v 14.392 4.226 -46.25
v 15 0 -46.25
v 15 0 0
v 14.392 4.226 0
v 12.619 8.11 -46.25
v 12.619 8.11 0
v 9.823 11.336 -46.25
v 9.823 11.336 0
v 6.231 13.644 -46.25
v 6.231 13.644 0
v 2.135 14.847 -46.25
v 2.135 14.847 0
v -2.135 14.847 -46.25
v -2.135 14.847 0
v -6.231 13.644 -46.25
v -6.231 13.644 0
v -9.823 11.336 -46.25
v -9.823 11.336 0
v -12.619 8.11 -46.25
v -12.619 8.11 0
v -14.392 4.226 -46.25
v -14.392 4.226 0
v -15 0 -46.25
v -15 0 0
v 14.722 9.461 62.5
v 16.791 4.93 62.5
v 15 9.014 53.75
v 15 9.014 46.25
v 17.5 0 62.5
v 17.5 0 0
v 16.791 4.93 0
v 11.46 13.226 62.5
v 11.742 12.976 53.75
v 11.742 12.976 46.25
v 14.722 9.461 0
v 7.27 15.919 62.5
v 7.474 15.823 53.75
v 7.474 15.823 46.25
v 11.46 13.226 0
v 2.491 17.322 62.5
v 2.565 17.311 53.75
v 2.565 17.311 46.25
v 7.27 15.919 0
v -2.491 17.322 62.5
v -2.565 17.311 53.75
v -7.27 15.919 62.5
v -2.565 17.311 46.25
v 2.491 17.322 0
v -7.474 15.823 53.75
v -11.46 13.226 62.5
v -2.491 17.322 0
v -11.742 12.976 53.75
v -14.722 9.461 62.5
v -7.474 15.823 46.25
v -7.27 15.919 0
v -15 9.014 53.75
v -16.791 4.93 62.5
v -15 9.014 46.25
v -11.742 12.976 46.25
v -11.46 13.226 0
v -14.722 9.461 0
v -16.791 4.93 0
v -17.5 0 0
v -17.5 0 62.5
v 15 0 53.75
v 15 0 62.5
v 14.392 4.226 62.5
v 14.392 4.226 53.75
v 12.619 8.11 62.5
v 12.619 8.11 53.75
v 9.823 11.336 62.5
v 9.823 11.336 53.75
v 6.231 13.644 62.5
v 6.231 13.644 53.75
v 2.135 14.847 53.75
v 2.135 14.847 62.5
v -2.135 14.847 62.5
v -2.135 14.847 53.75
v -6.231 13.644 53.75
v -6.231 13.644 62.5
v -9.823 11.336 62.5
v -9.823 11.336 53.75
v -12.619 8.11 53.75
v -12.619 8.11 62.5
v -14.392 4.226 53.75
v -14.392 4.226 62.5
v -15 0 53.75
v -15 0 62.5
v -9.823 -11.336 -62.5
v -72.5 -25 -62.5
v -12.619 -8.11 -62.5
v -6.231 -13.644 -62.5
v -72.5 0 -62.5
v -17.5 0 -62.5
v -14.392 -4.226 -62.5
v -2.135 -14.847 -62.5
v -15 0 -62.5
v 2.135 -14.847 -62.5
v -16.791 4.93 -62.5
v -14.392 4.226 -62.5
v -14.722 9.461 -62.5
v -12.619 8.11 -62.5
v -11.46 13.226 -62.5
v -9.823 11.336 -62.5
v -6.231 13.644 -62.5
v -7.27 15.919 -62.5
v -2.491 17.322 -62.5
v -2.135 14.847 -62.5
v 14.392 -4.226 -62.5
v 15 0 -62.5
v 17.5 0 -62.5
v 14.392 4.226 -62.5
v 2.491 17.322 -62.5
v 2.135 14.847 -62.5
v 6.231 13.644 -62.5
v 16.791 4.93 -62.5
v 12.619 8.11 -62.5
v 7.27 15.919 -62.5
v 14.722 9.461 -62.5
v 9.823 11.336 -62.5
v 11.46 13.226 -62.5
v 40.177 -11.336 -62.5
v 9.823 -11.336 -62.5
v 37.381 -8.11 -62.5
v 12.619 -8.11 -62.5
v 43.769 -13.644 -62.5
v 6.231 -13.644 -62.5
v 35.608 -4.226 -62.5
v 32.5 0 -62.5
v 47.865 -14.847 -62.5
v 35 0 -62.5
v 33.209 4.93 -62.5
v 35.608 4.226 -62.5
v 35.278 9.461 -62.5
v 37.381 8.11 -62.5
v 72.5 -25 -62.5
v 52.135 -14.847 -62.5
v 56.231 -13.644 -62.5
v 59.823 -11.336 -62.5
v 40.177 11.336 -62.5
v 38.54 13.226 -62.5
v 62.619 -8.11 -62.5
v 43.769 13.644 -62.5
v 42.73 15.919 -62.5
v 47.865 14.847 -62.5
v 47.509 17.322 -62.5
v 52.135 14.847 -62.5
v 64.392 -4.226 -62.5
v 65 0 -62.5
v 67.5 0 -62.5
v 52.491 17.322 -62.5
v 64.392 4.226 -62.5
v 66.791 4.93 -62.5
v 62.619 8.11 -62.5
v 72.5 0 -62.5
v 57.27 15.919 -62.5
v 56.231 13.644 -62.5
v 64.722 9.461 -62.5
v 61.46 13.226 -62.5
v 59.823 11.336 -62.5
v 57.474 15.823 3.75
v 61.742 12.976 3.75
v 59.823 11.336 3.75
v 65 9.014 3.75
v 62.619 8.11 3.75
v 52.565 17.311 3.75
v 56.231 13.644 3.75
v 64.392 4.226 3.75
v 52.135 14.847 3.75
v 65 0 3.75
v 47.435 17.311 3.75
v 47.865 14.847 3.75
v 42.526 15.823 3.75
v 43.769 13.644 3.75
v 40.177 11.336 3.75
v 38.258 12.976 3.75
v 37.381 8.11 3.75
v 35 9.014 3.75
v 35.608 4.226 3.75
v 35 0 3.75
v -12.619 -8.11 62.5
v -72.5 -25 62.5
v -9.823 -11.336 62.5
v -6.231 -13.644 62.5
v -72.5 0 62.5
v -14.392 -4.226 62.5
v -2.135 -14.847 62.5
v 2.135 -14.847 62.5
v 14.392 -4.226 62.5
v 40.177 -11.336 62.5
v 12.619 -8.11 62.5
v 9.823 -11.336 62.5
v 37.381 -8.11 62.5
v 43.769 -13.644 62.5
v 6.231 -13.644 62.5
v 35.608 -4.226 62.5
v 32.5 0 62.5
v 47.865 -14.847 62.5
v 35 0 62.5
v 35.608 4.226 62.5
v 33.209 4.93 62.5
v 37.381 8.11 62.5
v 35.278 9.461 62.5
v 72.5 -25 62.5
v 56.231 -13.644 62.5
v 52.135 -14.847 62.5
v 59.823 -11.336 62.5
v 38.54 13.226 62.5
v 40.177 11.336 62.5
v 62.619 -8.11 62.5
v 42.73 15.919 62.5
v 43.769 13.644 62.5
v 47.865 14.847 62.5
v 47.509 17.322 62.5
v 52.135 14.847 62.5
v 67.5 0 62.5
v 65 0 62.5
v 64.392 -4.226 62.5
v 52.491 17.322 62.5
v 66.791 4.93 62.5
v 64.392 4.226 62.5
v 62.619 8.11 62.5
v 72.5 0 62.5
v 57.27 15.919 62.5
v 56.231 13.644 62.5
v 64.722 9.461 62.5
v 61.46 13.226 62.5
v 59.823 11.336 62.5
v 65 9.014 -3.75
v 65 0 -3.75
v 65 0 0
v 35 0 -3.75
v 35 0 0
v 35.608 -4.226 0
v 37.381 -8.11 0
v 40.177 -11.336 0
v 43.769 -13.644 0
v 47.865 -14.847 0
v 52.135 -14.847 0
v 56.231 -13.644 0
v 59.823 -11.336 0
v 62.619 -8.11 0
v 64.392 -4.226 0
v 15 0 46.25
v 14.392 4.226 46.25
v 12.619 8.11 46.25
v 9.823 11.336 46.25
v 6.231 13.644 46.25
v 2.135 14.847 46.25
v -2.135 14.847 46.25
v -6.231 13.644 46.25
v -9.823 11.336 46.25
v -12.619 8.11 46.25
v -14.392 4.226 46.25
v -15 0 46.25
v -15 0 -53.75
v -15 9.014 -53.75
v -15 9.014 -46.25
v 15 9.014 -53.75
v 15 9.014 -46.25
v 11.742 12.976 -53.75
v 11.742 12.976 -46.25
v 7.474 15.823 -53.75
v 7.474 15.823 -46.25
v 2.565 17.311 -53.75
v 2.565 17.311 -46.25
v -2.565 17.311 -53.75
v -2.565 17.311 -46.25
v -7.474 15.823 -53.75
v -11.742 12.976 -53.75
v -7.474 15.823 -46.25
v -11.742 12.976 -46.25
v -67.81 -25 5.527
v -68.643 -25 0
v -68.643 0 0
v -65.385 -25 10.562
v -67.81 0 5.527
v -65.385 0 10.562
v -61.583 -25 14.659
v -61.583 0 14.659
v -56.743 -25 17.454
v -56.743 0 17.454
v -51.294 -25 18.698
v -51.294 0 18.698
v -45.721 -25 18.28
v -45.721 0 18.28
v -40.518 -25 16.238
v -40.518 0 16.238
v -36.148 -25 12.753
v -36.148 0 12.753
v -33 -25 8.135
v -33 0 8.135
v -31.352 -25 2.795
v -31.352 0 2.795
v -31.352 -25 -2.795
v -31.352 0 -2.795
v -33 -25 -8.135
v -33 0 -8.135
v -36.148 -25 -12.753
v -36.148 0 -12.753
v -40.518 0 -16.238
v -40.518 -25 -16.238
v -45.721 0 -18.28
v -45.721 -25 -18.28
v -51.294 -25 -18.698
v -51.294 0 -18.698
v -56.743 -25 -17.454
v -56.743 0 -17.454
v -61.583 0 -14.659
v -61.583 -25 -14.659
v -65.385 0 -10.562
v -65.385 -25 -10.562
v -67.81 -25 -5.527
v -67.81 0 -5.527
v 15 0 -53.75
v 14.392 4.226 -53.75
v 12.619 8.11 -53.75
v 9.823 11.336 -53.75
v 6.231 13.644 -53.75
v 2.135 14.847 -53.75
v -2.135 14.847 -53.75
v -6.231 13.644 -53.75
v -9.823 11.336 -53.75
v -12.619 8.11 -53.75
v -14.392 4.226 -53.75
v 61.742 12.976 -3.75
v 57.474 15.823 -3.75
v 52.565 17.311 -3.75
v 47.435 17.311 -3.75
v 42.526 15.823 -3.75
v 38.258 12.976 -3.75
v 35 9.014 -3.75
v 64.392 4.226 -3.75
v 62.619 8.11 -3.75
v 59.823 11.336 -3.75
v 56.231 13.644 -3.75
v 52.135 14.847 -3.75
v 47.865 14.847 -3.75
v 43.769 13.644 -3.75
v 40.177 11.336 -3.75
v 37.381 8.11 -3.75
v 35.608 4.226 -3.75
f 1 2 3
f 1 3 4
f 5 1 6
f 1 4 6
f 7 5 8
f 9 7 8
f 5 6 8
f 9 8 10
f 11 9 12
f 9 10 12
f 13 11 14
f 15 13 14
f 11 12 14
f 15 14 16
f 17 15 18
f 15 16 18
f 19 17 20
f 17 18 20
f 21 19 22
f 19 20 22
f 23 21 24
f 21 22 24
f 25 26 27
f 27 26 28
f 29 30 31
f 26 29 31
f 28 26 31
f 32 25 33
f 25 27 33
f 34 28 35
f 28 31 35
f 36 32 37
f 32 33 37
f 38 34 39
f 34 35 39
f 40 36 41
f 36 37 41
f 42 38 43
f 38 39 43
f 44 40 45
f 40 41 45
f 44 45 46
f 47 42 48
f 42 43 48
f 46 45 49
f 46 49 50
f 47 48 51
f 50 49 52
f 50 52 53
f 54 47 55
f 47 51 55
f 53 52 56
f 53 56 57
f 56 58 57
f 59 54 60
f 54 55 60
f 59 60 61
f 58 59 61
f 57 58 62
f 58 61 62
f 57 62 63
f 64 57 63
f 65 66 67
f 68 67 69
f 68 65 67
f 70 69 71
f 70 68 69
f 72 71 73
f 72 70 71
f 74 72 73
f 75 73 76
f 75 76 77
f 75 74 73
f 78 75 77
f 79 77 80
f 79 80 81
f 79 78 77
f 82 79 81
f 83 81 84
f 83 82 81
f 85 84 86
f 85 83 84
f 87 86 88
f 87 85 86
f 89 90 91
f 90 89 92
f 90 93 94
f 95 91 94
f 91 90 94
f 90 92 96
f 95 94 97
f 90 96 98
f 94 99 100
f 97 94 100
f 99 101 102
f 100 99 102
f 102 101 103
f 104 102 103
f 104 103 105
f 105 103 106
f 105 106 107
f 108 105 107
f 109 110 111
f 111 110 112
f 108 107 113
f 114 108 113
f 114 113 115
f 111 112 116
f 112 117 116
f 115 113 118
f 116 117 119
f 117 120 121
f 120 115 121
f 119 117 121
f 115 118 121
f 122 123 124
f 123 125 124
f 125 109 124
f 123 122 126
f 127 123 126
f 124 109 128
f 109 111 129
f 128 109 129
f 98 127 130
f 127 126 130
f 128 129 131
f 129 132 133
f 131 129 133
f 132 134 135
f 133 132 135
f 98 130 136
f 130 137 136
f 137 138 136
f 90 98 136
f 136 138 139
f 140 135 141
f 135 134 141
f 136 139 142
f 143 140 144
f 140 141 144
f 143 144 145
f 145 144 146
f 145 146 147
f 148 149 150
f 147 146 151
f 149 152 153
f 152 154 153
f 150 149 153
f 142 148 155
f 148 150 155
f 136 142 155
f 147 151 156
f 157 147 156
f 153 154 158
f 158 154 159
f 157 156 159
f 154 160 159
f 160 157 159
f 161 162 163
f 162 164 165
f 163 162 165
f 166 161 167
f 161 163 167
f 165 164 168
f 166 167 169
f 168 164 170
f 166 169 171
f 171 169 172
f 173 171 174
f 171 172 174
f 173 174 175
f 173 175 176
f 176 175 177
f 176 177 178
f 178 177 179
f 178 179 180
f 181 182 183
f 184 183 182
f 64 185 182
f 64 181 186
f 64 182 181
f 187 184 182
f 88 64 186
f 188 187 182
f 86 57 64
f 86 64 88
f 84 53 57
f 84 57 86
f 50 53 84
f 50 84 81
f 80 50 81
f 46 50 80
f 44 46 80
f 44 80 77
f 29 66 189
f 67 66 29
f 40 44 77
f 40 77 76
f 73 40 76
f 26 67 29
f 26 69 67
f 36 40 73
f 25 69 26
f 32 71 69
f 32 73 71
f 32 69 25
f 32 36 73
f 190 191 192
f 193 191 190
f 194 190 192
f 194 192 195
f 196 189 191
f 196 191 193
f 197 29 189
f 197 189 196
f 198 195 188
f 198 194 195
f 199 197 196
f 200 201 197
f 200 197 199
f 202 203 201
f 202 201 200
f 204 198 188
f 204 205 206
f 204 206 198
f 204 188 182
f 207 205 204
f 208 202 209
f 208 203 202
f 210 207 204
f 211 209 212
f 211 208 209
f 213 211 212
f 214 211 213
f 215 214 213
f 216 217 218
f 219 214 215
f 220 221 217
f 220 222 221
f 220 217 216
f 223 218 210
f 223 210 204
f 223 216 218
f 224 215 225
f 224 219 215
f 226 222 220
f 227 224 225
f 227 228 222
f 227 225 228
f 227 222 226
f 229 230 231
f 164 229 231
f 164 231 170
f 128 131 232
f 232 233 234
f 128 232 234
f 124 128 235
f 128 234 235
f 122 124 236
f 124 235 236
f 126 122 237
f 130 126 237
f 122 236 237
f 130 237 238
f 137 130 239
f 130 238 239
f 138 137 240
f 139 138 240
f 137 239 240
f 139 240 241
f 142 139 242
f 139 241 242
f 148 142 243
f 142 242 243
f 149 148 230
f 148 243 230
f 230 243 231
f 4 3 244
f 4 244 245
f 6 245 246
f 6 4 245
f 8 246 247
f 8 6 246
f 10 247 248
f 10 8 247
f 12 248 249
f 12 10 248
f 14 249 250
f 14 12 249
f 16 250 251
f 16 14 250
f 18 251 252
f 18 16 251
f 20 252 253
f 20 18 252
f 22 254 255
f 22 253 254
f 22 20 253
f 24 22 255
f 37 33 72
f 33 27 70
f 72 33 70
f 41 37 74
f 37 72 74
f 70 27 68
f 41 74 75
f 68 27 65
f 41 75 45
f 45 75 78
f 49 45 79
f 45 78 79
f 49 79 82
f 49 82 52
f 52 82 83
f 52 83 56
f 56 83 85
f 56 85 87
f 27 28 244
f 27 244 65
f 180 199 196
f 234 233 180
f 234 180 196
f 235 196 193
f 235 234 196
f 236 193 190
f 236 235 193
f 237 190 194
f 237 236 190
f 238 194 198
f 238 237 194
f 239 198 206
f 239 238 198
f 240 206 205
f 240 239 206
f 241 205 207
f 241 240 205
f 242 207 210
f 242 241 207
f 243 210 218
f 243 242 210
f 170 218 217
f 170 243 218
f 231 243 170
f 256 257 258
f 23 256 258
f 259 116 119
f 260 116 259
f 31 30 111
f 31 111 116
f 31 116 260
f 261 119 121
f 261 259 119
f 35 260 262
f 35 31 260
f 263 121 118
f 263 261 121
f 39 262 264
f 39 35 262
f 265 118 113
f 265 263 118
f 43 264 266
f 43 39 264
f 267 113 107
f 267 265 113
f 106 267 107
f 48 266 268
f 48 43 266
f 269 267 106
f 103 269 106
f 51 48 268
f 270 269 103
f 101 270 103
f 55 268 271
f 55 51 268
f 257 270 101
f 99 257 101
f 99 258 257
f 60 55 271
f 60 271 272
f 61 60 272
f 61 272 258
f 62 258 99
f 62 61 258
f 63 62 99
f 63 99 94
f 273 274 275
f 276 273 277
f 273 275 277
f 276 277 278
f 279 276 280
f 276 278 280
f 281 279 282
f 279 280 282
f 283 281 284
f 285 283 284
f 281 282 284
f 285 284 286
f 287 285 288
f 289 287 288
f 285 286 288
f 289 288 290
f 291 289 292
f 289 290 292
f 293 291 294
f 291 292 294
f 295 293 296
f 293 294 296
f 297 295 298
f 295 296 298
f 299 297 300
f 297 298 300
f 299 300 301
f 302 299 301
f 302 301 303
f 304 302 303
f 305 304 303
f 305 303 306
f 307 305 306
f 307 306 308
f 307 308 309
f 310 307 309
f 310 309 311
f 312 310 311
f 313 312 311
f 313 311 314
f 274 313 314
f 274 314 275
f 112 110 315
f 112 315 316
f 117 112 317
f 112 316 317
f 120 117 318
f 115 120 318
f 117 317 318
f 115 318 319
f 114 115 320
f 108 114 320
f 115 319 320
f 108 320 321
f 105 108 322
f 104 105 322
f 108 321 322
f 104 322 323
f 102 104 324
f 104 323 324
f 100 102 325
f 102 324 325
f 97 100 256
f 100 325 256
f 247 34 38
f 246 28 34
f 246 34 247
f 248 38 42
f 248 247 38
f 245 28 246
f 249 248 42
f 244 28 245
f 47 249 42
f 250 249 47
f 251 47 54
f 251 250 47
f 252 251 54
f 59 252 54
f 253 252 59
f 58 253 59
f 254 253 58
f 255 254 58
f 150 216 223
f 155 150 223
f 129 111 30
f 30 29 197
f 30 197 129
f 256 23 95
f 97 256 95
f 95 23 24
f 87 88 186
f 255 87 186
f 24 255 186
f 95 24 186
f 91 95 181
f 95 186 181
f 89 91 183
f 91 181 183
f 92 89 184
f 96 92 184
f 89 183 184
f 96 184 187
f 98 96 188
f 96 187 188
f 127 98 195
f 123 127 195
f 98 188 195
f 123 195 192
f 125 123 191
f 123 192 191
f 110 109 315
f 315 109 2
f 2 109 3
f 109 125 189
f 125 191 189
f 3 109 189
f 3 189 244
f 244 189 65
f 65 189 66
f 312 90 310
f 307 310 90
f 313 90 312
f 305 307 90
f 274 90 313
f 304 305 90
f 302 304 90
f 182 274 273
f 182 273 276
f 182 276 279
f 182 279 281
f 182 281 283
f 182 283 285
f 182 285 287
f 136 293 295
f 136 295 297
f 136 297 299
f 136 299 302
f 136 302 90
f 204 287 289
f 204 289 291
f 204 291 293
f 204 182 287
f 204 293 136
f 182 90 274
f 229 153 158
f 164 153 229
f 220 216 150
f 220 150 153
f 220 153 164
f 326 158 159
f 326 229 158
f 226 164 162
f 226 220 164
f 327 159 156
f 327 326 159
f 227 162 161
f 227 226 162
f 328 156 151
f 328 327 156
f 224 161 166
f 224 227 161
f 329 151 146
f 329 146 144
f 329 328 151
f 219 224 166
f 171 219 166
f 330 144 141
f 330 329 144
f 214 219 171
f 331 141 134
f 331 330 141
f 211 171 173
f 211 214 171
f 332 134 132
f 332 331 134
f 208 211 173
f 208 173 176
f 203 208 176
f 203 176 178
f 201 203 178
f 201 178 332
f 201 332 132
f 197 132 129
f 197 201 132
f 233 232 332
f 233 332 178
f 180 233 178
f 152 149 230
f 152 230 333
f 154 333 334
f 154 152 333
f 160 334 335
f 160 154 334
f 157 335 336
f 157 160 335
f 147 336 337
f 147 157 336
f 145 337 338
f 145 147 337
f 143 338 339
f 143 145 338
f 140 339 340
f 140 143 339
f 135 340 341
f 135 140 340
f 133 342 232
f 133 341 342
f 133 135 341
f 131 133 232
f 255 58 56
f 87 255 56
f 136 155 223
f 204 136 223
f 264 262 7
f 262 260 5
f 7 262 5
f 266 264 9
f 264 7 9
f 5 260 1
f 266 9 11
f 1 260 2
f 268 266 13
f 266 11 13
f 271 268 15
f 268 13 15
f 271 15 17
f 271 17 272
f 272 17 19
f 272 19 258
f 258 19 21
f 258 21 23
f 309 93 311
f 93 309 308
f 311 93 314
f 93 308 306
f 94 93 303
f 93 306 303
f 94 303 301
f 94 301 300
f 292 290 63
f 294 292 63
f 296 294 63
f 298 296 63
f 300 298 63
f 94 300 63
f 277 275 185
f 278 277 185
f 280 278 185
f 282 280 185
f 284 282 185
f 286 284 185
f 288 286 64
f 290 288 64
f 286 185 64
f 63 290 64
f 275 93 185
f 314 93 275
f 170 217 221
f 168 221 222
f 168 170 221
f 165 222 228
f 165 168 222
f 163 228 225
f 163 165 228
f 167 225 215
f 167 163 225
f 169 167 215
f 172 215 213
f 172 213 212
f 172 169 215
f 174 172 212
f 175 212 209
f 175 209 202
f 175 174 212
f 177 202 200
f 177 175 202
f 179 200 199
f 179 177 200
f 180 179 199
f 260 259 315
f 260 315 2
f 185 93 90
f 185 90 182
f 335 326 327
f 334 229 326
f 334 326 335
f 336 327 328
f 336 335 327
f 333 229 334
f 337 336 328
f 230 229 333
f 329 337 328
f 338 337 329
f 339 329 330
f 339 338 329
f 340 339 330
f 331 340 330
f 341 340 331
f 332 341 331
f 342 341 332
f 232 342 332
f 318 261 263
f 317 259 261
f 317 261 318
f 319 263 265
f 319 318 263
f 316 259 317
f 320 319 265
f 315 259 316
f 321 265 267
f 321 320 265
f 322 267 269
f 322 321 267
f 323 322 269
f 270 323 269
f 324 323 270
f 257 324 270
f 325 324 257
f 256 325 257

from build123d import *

# Parameters (mm, degrees)
F0_W     = 145
F0_H     = 125
F1_DEPTH = 25
F3_R     = 17.5
F3_R_2   = 15
F4_DEPTH = 62.5
F2_W     = 30
F2_H     = 7.5
F5_DEPTH = 25
F6_DEPTH = 25
F2_R     = 18.75
F7_DEPTH = 2000
F8_DEPTH = 12500


with BuildPart() as f1:
    # F0 (on Front) → F1 (new body)
    with BuildSketch(Plane.XZ):
        Rectangle(F0_W, F0_H)
    extrude(amount=F1_DEPTH)

    # F3 (on Top) → F4 (join, symmetric)
    with BuildSketch(Plane.XY):
        Circle(F3_R)
        Circle(F3_R_2, mode=Mode.SUBTRACT)
        with Locations((50, 0)):
            Circle(F3_R)
        with Locations((50, 0)):
            Circle(F3_R_2, mode=Mode.SUBTRACT)
    extrude(amount=F4_DEPTH, both=True)

    # F2 (on face) → F5 (cut)
    with BuildSketch(Plane(origin=(0, 0, 0), x_dir=(-1, 0, 0), z_dir=(0, 1, 0))):
        with Locations((0, 50)):
            Rectangle(F2_W, F2_H)
        with Locations((0, -50)):
            Rectangle(F2_W, F2_H)
    extrude(amount=F5_DEPTH, mode=Mode.SUBTRACT)

    # F2 (on face) → F6 (cut)
    with BuildSketch(Plane(origin=(0, 0, 0), x_dir=(-1, 0, 0), z_dir=(0, 1, 0))):
        with Locations((-50, 0)):
            Rectangle(F2_W, F2_H)
    extrude(amount=F6_DEPTH, mode=Mode.SUBTRACT)

    # F2 (on face) → F7 (cut)
    with BuildSketch(Plane(origin=(0, 0, 0), x_dir=(-1, 0, 0), z_dir=(0, 1, 0))):
        with Locations((49.892824, 0)):
            Circle(F2_R)
    extrude(amount=-F7_DEPTH, mode=Mode.SUBTRACT)

    # F3 (on Top) → F8 (cut, symmetric)
    with BuildSketch(Plane.XY):
        with Locations((50, 0)):
            Circle(F3_R_2)
        Circle(F3_R_2)
    extrude(amount=F8_DEPTH, both=True, mode=Mode.SUBTRACT)


solid = f1.part
